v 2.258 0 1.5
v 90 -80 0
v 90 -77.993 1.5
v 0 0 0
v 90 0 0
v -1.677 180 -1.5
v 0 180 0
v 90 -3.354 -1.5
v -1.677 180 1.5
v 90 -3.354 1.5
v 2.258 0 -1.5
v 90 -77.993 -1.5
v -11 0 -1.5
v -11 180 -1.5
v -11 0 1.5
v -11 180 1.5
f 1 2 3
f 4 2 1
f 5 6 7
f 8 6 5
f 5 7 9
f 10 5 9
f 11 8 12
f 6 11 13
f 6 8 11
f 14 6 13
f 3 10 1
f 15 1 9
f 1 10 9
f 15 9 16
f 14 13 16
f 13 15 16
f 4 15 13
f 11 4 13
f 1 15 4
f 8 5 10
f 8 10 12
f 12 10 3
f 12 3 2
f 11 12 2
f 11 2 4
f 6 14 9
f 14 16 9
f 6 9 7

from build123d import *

# Parameters (mm, degrees)
SKETCH1_W           = 11
SKETCH1_H           = 180
BOSS_EXTRUDE1_DEPTH = 1.5
CHAMFER1_SIZE       = 1.5
CHAMFER2_SIZE       = 1.5


with BuildPart() as part:
    # Sketch1 → Boss-Extrude1 (new, symmetric)
    with BuildSketch(Plane.XY):
        Polygon((90, -80), (0, 0), (0, 180), (90, 0), align=None)
        with Locations((-5.5, 90)):
            Rectangle(SKETCH1_W, SKETCH1_H)
    extrude(amount=BOSS_EXTRUDE1_DEPTH, both=True)

    # Chamfer1
    chamfer1_edges = [part.edges().sort_by_distance(p)[0] for p in [
        (45, 90, -1.5),
        (45, 90, 1.5),
    ]]
    chamfer(chamfer1_edges, length=CHAMFER1_SIZE - 0.0001)  # a hair under: the kernel refuses the full size

    # Chamfer2
    chamfer2_edges = [part.edges().sort_by_distance(p)[0] for p in [
        (45, -40, 1.5),
        (45, -40, -1.5),
    ]]
    chamfer(chamfer2_edges, length=CHAMFER2_SIZE - 0.0001)  # a hair under: the kernel refuses the full size


solid = part.part
